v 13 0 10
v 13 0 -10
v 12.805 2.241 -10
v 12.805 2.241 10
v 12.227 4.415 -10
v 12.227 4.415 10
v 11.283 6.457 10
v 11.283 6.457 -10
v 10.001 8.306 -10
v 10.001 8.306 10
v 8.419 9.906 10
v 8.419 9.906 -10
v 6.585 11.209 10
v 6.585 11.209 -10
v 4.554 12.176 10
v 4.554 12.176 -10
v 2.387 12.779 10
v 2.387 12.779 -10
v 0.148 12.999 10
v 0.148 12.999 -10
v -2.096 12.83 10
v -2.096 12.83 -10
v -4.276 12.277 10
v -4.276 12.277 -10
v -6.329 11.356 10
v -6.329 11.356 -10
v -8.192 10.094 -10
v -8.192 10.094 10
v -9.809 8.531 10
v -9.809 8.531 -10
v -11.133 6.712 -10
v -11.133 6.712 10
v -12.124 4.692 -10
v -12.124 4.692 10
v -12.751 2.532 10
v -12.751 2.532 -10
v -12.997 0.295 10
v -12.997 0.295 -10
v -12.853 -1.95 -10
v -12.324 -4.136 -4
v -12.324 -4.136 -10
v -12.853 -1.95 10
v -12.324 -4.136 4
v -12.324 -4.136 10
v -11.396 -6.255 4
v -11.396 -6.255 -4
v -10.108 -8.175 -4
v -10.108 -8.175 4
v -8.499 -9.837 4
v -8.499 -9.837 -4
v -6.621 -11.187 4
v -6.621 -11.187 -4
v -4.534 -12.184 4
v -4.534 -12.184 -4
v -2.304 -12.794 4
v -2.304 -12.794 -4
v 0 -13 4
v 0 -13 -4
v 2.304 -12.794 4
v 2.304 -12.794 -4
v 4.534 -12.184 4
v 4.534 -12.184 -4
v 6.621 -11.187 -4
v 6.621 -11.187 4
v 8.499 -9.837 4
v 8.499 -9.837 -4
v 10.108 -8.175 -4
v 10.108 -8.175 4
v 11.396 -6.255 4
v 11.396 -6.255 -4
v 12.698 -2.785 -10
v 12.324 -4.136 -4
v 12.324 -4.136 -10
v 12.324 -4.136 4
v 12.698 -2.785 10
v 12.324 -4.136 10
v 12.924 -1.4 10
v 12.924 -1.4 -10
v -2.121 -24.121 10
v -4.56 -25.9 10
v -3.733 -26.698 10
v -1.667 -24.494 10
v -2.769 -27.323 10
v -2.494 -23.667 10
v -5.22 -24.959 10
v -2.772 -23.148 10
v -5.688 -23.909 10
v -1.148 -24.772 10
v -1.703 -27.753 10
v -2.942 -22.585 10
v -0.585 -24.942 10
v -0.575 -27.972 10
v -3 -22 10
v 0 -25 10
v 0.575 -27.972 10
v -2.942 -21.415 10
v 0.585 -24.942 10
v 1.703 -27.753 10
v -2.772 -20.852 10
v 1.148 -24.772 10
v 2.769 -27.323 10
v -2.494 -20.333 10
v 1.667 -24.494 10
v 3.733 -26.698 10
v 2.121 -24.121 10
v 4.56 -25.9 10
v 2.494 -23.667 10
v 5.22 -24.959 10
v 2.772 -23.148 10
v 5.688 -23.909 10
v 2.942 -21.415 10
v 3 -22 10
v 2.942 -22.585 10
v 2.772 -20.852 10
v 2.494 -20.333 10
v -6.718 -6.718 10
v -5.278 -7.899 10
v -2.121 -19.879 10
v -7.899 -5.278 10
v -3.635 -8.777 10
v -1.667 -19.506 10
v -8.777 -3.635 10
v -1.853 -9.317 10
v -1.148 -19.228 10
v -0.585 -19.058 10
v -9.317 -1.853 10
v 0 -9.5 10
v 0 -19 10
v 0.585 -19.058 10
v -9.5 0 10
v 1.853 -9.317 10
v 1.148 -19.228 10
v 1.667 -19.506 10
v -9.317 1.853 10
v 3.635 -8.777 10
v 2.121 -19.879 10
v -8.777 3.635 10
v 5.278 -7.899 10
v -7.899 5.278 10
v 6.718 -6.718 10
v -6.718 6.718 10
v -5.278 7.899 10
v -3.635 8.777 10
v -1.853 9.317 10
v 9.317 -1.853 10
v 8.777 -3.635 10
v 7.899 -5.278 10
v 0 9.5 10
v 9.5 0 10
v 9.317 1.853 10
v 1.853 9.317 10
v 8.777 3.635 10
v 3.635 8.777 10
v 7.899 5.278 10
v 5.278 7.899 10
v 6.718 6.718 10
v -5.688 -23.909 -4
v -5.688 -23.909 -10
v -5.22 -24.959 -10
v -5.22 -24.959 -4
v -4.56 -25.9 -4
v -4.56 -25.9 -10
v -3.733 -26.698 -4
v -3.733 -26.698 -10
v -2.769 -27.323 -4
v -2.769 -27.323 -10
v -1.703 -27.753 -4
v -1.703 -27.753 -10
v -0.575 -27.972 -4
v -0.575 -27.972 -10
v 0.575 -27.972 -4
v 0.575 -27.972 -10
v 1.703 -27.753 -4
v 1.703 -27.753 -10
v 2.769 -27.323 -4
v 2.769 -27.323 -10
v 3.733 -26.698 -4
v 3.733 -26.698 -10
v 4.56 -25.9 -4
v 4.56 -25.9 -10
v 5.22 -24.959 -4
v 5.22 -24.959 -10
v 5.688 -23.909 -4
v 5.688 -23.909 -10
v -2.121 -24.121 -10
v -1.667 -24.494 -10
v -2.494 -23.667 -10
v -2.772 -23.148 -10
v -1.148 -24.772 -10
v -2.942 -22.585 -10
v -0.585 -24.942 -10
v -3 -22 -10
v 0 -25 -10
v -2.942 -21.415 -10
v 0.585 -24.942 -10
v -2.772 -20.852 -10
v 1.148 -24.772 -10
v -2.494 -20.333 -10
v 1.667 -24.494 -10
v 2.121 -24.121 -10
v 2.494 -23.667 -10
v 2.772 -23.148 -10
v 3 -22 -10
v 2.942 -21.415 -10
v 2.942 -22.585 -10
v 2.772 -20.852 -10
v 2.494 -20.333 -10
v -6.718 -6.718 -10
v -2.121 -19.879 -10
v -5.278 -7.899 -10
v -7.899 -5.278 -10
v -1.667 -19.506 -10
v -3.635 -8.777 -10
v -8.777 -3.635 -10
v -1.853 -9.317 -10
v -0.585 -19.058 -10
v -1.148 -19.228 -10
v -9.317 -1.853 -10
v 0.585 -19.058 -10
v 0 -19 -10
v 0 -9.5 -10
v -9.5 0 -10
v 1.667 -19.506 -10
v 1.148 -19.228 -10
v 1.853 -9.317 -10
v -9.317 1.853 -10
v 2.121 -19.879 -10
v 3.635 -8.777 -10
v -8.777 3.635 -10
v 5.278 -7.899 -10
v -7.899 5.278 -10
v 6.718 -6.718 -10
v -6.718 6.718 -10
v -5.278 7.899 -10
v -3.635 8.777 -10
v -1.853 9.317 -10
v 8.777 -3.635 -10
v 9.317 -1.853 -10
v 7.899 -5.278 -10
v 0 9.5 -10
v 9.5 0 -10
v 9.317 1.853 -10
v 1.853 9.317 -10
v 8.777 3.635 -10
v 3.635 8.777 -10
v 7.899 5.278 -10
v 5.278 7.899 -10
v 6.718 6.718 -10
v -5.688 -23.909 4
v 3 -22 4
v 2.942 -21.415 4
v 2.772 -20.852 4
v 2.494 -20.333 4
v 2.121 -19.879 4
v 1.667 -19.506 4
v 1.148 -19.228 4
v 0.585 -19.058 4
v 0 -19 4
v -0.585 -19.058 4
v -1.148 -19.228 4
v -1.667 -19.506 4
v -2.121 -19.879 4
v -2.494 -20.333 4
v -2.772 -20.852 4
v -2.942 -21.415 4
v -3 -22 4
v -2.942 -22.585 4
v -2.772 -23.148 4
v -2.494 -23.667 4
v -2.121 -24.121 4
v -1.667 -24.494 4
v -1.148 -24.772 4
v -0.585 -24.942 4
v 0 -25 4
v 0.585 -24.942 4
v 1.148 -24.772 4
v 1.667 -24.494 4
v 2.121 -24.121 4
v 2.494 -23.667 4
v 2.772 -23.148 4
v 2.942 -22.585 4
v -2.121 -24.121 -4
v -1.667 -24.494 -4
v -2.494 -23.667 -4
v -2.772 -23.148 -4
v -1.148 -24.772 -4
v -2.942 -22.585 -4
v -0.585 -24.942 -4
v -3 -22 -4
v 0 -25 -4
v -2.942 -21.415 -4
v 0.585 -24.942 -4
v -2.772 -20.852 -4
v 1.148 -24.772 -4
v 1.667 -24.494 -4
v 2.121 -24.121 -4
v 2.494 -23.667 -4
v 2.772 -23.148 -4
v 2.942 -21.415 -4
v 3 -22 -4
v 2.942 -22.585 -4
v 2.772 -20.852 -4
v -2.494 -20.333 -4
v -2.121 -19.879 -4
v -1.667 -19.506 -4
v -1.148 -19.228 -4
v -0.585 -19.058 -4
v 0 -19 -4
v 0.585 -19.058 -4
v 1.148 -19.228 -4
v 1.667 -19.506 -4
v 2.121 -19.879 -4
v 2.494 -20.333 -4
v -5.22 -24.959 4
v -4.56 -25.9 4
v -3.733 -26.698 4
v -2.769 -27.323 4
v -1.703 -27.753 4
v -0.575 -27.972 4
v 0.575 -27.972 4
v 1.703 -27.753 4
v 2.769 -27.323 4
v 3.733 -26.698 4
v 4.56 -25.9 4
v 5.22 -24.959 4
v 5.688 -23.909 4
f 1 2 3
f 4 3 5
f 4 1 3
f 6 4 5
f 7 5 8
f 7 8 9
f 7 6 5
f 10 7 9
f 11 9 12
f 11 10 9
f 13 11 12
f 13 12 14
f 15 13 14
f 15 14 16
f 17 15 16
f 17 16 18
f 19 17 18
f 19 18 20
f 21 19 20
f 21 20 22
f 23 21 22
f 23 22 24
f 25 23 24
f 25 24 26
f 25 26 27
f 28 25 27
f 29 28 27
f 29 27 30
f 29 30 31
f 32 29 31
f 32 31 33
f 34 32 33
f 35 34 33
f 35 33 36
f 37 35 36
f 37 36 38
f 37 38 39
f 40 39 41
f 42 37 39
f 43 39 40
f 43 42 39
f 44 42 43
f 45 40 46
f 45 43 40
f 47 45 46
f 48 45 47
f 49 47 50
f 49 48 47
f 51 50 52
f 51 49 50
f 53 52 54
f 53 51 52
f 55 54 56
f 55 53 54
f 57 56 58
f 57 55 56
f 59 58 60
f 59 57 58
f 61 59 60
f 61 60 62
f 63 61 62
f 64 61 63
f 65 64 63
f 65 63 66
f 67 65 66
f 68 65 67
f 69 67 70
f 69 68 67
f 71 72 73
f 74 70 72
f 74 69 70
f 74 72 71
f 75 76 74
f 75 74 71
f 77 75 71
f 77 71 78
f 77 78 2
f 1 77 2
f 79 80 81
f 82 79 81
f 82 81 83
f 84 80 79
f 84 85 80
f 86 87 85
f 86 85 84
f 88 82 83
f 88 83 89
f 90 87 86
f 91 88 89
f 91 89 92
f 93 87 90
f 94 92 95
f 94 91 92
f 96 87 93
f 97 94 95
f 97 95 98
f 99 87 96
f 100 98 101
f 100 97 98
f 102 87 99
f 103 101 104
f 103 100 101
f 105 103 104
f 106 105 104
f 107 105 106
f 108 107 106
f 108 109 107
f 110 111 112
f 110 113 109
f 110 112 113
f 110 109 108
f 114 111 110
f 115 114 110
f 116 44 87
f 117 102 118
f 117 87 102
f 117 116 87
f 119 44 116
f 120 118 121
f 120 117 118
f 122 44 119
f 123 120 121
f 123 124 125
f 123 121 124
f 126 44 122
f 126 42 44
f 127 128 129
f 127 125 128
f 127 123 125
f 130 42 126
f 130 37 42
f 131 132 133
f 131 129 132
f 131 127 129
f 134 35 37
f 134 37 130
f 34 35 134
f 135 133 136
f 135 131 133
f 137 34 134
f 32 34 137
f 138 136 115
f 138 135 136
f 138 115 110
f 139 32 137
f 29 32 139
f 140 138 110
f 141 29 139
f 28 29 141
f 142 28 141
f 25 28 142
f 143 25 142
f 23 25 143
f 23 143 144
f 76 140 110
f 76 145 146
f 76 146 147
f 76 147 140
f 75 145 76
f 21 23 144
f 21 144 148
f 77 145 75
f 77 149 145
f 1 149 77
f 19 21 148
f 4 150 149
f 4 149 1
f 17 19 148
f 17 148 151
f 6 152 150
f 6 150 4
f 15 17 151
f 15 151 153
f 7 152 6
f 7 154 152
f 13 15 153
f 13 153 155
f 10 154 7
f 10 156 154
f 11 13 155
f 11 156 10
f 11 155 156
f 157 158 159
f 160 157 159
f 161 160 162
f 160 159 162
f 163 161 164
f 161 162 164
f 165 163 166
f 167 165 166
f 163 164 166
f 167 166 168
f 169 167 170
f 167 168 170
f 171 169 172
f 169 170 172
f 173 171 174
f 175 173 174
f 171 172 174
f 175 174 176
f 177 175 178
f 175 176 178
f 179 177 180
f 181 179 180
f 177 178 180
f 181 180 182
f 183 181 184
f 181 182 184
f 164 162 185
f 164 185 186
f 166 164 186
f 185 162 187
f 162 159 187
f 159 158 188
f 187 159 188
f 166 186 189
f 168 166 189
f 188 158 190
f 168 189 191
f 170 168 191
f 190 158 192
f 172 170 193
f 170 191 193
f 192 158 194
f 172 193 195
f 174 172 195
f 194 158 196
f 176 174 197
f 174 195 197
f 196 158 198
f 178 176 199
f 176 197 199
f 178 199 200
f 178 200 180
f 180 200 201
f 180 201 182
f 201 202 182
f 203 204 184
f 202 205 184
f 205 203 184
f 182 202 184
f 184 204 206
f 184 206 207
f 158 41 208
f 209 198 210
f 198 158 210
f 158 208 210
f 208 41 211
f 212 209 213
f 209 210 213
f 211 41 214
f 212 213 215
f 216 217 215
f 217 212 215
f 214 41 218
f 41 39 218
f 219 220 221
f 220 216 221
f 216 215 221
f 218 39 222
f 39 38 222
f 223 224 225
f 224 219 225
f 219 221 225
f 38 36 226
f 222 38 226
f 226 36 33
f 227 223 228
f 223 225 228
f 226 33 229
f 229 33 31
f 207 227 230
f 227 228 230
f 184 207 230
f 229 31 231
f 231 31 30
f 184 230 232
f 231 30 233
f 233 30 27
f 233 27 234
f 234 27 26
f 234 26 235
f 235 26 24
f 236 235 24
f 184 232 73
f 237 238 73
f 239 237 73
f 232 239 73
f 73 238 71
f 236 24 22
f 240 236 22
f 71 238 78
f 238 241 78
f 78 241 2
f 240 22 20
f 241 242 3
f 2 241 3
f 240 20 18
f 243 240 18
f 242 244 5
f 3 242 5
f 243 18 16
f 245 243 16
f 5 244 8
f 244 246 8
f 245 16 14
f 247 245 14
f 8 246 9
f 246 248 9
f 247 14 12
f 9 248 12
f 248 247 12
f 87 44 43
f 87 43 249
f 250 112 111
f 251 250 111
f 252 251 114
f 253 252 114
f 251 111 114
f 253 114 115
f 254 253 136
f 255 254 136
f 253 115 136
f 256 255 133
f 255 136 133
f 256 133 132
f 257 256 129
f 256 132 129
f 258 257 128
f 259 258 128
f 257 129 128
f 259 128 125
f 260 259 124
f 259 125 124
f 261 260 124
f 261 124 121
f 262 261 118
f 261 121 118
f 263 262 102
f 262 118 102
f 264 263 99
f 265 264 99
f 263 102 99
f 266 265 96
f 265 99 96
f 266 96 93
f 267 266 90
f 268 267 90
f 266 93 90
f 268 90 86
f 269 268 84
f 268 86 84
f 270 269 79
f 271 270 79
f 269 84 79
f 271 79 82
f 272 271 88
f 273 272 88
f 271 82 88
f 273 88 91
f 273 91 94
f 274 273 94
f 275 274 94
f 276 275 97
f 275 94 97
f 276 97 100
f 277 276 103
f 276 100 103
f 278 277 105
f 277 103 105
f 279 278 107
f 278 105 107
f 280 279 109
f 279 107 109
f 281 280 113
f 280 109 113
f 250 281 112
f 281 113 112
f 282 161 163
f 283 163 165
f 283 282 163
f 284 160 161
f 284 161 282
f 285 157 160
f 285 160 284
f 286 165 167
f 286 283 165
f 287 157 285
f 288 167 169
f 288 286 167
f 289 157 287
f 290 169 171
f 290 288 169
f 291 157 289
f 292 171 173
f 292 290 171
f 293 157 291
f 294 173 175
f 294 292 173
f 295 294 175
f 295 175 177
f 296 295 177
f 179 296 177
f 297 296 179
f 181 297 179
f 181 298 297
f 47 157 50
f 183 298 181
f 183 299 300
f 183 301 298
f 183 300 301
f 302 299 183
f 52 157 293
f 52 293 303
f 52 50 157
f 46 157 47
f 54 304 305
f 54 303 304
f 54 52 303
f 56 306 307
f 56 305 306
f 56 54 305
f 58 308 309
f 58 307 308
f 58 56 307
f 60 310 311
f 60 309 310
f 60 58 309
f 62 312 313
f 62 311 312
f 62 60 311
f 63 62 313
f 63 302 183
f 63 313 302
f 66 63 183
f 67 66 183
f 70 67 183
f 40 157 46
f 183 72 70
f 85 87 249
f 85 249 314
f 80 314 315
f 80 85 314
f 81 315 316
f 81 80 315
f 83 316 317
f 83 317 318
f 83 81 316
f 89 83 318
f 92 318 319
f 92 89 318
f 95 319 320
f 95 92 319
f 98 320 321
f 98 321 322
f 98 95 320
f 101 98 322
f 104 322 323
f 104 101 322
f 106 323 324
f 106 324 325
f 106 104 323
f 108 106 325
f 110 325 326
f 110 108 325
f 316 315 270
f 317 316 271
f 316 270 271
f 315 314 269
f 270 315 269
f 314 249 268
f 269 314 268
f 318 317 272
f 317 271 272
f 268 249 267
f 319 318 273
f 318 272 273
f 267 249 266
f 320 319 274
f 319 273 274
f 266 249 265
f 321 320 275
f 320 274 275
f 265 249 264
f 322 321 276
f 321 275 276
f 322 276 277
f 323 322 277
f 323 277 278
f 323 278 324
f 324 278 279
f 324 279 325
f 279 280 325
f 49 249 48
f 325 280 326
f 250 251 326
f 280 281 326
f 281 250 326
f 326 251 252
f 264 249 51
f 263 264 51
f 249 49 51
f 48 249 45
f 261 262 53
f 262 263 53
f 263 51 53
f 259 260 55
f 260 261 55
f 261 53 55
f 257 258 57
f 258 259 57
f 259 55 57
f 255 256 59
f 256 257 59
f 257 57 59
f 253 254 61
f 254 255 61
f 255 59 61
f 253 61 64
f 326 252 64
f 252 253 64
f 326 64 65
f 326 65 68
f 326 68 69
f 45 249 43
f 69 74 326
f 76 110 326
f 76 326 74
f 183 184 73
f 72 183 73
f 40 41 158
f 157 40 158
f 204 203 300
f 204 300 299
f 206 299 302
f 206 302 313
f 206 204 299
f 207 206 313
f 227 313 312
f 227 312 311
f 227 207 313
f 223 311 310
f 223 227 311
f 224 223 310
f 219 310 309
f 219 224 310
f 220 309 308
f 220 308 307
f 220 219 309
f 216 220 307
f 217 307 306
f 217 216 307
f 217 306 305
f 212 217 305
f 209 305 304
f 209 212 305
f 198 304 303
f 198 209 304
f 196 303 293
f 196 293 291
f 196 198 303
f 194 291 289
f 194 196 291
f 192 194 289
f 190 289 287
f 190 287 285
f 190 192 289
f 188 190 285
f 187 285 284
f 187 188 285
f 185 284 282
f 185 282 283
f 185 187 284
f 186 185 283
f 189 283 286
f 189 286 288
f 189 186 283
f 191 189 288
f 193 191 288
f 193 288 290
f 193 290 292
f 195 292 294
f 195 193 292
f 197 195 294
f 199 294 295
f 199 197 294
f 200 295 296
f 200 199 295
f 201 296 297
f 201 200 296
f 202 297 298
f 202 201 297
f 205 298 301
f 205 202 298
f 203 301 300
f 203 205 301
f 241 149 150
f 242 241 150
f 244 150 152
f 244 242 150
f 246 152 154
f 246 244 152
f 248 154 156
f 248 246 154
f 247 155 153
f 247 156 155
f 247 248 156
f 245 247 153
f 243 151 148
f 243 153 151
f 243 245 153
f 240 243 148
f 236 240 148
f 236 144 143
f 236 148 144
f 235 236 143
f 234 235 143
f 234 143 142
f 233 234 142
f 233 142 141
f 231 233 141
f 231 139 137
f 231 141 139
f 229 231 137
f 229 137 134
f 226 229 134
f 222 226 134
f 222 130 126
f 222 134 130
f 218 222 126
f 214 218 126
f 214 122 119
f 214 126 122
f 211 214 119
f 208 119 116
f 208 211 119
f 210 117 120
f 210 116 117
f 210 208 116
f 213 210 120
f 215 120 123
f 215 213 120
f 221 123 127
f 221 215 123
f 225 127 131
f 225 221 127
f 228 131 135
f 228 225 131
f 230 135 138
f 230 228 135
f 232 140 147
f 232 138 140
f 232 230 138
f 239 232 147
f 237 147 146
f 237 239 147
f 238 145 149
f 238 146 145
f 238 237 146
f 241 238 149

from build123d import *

# Parameters (mm, degrees)
SKETCH1_R               = 13
BOSS_EXTRUDE1_DEPTH     = 10
SKETCH2_R               = 3
BOSS_EXTRUDE2_DEPTH     = 6
CUT_EXTRUDE1_DEPTH      = 37.783148315
CUT_EXTRUDE1_DEPTH_BACK = 37.783148315
SKETCH3_R               = 9.5


with BuildPart() as part:
    # Sketch1 → Boss-Extrude1 (new, symmetric)
    with BuildSketch(Plane(origin=(0, 0, 0), x_dir=(0, 1, 0), z_dir=(0, 0, 1))):
        with Locations(Location((0, 0, 0), (0, 0, 270))):
            Circle(SKETCH1_R)
    extrude(amount=BOSS_EXTRUDE1_DEPTH, both=True)

    # Sketch2 → Boss-Extrude2 (add)
    with BuildSketch(Plane.XY.offset(10)):
        with BuildLine():
            Line((-12.324386227, -4.136363636), (-5.688178259, -23.909090909))
            ThreePointArc((-5.688178259, -23.909090909), (0, -28), (5.688178259, -23.909090909))
            Line((5.688178259, -23.909090909), (12.324386227, -4.136363636))
            ThreePointArc((12.324386227, -4.136363636), (0, 13), (-12.324386227, -4.136363636))
        make_face()
        with Locations((0, -22)):
            Circle(SKETCH2_R, mode=Mode.SUBTRACT)
    boss_extrude2 = extrude(amount=-BOSS_EXTRUDE2_DEPTH)

    # Mirror1: Boss-Extrude2 across plane
    add(boss_extrude2.mirror(Plane.XY))

    # Sketch3 → Cut-Extrude1 (cut, two sides: drawn at the far end of the back side and taken through both)
    with BuildSketch(Plane.XY.offset(10).offset(-CUT_EXTRUDE1_DEPTH_BACK)):
        Circle(SKETCH3_R)
    extrude(amount=CUT_EXTRUDE1_DEPTH + CUT_EXTRUDE1_DEPTH_BACK, mode=Mode.SUBTRACT)


solid = part.part
